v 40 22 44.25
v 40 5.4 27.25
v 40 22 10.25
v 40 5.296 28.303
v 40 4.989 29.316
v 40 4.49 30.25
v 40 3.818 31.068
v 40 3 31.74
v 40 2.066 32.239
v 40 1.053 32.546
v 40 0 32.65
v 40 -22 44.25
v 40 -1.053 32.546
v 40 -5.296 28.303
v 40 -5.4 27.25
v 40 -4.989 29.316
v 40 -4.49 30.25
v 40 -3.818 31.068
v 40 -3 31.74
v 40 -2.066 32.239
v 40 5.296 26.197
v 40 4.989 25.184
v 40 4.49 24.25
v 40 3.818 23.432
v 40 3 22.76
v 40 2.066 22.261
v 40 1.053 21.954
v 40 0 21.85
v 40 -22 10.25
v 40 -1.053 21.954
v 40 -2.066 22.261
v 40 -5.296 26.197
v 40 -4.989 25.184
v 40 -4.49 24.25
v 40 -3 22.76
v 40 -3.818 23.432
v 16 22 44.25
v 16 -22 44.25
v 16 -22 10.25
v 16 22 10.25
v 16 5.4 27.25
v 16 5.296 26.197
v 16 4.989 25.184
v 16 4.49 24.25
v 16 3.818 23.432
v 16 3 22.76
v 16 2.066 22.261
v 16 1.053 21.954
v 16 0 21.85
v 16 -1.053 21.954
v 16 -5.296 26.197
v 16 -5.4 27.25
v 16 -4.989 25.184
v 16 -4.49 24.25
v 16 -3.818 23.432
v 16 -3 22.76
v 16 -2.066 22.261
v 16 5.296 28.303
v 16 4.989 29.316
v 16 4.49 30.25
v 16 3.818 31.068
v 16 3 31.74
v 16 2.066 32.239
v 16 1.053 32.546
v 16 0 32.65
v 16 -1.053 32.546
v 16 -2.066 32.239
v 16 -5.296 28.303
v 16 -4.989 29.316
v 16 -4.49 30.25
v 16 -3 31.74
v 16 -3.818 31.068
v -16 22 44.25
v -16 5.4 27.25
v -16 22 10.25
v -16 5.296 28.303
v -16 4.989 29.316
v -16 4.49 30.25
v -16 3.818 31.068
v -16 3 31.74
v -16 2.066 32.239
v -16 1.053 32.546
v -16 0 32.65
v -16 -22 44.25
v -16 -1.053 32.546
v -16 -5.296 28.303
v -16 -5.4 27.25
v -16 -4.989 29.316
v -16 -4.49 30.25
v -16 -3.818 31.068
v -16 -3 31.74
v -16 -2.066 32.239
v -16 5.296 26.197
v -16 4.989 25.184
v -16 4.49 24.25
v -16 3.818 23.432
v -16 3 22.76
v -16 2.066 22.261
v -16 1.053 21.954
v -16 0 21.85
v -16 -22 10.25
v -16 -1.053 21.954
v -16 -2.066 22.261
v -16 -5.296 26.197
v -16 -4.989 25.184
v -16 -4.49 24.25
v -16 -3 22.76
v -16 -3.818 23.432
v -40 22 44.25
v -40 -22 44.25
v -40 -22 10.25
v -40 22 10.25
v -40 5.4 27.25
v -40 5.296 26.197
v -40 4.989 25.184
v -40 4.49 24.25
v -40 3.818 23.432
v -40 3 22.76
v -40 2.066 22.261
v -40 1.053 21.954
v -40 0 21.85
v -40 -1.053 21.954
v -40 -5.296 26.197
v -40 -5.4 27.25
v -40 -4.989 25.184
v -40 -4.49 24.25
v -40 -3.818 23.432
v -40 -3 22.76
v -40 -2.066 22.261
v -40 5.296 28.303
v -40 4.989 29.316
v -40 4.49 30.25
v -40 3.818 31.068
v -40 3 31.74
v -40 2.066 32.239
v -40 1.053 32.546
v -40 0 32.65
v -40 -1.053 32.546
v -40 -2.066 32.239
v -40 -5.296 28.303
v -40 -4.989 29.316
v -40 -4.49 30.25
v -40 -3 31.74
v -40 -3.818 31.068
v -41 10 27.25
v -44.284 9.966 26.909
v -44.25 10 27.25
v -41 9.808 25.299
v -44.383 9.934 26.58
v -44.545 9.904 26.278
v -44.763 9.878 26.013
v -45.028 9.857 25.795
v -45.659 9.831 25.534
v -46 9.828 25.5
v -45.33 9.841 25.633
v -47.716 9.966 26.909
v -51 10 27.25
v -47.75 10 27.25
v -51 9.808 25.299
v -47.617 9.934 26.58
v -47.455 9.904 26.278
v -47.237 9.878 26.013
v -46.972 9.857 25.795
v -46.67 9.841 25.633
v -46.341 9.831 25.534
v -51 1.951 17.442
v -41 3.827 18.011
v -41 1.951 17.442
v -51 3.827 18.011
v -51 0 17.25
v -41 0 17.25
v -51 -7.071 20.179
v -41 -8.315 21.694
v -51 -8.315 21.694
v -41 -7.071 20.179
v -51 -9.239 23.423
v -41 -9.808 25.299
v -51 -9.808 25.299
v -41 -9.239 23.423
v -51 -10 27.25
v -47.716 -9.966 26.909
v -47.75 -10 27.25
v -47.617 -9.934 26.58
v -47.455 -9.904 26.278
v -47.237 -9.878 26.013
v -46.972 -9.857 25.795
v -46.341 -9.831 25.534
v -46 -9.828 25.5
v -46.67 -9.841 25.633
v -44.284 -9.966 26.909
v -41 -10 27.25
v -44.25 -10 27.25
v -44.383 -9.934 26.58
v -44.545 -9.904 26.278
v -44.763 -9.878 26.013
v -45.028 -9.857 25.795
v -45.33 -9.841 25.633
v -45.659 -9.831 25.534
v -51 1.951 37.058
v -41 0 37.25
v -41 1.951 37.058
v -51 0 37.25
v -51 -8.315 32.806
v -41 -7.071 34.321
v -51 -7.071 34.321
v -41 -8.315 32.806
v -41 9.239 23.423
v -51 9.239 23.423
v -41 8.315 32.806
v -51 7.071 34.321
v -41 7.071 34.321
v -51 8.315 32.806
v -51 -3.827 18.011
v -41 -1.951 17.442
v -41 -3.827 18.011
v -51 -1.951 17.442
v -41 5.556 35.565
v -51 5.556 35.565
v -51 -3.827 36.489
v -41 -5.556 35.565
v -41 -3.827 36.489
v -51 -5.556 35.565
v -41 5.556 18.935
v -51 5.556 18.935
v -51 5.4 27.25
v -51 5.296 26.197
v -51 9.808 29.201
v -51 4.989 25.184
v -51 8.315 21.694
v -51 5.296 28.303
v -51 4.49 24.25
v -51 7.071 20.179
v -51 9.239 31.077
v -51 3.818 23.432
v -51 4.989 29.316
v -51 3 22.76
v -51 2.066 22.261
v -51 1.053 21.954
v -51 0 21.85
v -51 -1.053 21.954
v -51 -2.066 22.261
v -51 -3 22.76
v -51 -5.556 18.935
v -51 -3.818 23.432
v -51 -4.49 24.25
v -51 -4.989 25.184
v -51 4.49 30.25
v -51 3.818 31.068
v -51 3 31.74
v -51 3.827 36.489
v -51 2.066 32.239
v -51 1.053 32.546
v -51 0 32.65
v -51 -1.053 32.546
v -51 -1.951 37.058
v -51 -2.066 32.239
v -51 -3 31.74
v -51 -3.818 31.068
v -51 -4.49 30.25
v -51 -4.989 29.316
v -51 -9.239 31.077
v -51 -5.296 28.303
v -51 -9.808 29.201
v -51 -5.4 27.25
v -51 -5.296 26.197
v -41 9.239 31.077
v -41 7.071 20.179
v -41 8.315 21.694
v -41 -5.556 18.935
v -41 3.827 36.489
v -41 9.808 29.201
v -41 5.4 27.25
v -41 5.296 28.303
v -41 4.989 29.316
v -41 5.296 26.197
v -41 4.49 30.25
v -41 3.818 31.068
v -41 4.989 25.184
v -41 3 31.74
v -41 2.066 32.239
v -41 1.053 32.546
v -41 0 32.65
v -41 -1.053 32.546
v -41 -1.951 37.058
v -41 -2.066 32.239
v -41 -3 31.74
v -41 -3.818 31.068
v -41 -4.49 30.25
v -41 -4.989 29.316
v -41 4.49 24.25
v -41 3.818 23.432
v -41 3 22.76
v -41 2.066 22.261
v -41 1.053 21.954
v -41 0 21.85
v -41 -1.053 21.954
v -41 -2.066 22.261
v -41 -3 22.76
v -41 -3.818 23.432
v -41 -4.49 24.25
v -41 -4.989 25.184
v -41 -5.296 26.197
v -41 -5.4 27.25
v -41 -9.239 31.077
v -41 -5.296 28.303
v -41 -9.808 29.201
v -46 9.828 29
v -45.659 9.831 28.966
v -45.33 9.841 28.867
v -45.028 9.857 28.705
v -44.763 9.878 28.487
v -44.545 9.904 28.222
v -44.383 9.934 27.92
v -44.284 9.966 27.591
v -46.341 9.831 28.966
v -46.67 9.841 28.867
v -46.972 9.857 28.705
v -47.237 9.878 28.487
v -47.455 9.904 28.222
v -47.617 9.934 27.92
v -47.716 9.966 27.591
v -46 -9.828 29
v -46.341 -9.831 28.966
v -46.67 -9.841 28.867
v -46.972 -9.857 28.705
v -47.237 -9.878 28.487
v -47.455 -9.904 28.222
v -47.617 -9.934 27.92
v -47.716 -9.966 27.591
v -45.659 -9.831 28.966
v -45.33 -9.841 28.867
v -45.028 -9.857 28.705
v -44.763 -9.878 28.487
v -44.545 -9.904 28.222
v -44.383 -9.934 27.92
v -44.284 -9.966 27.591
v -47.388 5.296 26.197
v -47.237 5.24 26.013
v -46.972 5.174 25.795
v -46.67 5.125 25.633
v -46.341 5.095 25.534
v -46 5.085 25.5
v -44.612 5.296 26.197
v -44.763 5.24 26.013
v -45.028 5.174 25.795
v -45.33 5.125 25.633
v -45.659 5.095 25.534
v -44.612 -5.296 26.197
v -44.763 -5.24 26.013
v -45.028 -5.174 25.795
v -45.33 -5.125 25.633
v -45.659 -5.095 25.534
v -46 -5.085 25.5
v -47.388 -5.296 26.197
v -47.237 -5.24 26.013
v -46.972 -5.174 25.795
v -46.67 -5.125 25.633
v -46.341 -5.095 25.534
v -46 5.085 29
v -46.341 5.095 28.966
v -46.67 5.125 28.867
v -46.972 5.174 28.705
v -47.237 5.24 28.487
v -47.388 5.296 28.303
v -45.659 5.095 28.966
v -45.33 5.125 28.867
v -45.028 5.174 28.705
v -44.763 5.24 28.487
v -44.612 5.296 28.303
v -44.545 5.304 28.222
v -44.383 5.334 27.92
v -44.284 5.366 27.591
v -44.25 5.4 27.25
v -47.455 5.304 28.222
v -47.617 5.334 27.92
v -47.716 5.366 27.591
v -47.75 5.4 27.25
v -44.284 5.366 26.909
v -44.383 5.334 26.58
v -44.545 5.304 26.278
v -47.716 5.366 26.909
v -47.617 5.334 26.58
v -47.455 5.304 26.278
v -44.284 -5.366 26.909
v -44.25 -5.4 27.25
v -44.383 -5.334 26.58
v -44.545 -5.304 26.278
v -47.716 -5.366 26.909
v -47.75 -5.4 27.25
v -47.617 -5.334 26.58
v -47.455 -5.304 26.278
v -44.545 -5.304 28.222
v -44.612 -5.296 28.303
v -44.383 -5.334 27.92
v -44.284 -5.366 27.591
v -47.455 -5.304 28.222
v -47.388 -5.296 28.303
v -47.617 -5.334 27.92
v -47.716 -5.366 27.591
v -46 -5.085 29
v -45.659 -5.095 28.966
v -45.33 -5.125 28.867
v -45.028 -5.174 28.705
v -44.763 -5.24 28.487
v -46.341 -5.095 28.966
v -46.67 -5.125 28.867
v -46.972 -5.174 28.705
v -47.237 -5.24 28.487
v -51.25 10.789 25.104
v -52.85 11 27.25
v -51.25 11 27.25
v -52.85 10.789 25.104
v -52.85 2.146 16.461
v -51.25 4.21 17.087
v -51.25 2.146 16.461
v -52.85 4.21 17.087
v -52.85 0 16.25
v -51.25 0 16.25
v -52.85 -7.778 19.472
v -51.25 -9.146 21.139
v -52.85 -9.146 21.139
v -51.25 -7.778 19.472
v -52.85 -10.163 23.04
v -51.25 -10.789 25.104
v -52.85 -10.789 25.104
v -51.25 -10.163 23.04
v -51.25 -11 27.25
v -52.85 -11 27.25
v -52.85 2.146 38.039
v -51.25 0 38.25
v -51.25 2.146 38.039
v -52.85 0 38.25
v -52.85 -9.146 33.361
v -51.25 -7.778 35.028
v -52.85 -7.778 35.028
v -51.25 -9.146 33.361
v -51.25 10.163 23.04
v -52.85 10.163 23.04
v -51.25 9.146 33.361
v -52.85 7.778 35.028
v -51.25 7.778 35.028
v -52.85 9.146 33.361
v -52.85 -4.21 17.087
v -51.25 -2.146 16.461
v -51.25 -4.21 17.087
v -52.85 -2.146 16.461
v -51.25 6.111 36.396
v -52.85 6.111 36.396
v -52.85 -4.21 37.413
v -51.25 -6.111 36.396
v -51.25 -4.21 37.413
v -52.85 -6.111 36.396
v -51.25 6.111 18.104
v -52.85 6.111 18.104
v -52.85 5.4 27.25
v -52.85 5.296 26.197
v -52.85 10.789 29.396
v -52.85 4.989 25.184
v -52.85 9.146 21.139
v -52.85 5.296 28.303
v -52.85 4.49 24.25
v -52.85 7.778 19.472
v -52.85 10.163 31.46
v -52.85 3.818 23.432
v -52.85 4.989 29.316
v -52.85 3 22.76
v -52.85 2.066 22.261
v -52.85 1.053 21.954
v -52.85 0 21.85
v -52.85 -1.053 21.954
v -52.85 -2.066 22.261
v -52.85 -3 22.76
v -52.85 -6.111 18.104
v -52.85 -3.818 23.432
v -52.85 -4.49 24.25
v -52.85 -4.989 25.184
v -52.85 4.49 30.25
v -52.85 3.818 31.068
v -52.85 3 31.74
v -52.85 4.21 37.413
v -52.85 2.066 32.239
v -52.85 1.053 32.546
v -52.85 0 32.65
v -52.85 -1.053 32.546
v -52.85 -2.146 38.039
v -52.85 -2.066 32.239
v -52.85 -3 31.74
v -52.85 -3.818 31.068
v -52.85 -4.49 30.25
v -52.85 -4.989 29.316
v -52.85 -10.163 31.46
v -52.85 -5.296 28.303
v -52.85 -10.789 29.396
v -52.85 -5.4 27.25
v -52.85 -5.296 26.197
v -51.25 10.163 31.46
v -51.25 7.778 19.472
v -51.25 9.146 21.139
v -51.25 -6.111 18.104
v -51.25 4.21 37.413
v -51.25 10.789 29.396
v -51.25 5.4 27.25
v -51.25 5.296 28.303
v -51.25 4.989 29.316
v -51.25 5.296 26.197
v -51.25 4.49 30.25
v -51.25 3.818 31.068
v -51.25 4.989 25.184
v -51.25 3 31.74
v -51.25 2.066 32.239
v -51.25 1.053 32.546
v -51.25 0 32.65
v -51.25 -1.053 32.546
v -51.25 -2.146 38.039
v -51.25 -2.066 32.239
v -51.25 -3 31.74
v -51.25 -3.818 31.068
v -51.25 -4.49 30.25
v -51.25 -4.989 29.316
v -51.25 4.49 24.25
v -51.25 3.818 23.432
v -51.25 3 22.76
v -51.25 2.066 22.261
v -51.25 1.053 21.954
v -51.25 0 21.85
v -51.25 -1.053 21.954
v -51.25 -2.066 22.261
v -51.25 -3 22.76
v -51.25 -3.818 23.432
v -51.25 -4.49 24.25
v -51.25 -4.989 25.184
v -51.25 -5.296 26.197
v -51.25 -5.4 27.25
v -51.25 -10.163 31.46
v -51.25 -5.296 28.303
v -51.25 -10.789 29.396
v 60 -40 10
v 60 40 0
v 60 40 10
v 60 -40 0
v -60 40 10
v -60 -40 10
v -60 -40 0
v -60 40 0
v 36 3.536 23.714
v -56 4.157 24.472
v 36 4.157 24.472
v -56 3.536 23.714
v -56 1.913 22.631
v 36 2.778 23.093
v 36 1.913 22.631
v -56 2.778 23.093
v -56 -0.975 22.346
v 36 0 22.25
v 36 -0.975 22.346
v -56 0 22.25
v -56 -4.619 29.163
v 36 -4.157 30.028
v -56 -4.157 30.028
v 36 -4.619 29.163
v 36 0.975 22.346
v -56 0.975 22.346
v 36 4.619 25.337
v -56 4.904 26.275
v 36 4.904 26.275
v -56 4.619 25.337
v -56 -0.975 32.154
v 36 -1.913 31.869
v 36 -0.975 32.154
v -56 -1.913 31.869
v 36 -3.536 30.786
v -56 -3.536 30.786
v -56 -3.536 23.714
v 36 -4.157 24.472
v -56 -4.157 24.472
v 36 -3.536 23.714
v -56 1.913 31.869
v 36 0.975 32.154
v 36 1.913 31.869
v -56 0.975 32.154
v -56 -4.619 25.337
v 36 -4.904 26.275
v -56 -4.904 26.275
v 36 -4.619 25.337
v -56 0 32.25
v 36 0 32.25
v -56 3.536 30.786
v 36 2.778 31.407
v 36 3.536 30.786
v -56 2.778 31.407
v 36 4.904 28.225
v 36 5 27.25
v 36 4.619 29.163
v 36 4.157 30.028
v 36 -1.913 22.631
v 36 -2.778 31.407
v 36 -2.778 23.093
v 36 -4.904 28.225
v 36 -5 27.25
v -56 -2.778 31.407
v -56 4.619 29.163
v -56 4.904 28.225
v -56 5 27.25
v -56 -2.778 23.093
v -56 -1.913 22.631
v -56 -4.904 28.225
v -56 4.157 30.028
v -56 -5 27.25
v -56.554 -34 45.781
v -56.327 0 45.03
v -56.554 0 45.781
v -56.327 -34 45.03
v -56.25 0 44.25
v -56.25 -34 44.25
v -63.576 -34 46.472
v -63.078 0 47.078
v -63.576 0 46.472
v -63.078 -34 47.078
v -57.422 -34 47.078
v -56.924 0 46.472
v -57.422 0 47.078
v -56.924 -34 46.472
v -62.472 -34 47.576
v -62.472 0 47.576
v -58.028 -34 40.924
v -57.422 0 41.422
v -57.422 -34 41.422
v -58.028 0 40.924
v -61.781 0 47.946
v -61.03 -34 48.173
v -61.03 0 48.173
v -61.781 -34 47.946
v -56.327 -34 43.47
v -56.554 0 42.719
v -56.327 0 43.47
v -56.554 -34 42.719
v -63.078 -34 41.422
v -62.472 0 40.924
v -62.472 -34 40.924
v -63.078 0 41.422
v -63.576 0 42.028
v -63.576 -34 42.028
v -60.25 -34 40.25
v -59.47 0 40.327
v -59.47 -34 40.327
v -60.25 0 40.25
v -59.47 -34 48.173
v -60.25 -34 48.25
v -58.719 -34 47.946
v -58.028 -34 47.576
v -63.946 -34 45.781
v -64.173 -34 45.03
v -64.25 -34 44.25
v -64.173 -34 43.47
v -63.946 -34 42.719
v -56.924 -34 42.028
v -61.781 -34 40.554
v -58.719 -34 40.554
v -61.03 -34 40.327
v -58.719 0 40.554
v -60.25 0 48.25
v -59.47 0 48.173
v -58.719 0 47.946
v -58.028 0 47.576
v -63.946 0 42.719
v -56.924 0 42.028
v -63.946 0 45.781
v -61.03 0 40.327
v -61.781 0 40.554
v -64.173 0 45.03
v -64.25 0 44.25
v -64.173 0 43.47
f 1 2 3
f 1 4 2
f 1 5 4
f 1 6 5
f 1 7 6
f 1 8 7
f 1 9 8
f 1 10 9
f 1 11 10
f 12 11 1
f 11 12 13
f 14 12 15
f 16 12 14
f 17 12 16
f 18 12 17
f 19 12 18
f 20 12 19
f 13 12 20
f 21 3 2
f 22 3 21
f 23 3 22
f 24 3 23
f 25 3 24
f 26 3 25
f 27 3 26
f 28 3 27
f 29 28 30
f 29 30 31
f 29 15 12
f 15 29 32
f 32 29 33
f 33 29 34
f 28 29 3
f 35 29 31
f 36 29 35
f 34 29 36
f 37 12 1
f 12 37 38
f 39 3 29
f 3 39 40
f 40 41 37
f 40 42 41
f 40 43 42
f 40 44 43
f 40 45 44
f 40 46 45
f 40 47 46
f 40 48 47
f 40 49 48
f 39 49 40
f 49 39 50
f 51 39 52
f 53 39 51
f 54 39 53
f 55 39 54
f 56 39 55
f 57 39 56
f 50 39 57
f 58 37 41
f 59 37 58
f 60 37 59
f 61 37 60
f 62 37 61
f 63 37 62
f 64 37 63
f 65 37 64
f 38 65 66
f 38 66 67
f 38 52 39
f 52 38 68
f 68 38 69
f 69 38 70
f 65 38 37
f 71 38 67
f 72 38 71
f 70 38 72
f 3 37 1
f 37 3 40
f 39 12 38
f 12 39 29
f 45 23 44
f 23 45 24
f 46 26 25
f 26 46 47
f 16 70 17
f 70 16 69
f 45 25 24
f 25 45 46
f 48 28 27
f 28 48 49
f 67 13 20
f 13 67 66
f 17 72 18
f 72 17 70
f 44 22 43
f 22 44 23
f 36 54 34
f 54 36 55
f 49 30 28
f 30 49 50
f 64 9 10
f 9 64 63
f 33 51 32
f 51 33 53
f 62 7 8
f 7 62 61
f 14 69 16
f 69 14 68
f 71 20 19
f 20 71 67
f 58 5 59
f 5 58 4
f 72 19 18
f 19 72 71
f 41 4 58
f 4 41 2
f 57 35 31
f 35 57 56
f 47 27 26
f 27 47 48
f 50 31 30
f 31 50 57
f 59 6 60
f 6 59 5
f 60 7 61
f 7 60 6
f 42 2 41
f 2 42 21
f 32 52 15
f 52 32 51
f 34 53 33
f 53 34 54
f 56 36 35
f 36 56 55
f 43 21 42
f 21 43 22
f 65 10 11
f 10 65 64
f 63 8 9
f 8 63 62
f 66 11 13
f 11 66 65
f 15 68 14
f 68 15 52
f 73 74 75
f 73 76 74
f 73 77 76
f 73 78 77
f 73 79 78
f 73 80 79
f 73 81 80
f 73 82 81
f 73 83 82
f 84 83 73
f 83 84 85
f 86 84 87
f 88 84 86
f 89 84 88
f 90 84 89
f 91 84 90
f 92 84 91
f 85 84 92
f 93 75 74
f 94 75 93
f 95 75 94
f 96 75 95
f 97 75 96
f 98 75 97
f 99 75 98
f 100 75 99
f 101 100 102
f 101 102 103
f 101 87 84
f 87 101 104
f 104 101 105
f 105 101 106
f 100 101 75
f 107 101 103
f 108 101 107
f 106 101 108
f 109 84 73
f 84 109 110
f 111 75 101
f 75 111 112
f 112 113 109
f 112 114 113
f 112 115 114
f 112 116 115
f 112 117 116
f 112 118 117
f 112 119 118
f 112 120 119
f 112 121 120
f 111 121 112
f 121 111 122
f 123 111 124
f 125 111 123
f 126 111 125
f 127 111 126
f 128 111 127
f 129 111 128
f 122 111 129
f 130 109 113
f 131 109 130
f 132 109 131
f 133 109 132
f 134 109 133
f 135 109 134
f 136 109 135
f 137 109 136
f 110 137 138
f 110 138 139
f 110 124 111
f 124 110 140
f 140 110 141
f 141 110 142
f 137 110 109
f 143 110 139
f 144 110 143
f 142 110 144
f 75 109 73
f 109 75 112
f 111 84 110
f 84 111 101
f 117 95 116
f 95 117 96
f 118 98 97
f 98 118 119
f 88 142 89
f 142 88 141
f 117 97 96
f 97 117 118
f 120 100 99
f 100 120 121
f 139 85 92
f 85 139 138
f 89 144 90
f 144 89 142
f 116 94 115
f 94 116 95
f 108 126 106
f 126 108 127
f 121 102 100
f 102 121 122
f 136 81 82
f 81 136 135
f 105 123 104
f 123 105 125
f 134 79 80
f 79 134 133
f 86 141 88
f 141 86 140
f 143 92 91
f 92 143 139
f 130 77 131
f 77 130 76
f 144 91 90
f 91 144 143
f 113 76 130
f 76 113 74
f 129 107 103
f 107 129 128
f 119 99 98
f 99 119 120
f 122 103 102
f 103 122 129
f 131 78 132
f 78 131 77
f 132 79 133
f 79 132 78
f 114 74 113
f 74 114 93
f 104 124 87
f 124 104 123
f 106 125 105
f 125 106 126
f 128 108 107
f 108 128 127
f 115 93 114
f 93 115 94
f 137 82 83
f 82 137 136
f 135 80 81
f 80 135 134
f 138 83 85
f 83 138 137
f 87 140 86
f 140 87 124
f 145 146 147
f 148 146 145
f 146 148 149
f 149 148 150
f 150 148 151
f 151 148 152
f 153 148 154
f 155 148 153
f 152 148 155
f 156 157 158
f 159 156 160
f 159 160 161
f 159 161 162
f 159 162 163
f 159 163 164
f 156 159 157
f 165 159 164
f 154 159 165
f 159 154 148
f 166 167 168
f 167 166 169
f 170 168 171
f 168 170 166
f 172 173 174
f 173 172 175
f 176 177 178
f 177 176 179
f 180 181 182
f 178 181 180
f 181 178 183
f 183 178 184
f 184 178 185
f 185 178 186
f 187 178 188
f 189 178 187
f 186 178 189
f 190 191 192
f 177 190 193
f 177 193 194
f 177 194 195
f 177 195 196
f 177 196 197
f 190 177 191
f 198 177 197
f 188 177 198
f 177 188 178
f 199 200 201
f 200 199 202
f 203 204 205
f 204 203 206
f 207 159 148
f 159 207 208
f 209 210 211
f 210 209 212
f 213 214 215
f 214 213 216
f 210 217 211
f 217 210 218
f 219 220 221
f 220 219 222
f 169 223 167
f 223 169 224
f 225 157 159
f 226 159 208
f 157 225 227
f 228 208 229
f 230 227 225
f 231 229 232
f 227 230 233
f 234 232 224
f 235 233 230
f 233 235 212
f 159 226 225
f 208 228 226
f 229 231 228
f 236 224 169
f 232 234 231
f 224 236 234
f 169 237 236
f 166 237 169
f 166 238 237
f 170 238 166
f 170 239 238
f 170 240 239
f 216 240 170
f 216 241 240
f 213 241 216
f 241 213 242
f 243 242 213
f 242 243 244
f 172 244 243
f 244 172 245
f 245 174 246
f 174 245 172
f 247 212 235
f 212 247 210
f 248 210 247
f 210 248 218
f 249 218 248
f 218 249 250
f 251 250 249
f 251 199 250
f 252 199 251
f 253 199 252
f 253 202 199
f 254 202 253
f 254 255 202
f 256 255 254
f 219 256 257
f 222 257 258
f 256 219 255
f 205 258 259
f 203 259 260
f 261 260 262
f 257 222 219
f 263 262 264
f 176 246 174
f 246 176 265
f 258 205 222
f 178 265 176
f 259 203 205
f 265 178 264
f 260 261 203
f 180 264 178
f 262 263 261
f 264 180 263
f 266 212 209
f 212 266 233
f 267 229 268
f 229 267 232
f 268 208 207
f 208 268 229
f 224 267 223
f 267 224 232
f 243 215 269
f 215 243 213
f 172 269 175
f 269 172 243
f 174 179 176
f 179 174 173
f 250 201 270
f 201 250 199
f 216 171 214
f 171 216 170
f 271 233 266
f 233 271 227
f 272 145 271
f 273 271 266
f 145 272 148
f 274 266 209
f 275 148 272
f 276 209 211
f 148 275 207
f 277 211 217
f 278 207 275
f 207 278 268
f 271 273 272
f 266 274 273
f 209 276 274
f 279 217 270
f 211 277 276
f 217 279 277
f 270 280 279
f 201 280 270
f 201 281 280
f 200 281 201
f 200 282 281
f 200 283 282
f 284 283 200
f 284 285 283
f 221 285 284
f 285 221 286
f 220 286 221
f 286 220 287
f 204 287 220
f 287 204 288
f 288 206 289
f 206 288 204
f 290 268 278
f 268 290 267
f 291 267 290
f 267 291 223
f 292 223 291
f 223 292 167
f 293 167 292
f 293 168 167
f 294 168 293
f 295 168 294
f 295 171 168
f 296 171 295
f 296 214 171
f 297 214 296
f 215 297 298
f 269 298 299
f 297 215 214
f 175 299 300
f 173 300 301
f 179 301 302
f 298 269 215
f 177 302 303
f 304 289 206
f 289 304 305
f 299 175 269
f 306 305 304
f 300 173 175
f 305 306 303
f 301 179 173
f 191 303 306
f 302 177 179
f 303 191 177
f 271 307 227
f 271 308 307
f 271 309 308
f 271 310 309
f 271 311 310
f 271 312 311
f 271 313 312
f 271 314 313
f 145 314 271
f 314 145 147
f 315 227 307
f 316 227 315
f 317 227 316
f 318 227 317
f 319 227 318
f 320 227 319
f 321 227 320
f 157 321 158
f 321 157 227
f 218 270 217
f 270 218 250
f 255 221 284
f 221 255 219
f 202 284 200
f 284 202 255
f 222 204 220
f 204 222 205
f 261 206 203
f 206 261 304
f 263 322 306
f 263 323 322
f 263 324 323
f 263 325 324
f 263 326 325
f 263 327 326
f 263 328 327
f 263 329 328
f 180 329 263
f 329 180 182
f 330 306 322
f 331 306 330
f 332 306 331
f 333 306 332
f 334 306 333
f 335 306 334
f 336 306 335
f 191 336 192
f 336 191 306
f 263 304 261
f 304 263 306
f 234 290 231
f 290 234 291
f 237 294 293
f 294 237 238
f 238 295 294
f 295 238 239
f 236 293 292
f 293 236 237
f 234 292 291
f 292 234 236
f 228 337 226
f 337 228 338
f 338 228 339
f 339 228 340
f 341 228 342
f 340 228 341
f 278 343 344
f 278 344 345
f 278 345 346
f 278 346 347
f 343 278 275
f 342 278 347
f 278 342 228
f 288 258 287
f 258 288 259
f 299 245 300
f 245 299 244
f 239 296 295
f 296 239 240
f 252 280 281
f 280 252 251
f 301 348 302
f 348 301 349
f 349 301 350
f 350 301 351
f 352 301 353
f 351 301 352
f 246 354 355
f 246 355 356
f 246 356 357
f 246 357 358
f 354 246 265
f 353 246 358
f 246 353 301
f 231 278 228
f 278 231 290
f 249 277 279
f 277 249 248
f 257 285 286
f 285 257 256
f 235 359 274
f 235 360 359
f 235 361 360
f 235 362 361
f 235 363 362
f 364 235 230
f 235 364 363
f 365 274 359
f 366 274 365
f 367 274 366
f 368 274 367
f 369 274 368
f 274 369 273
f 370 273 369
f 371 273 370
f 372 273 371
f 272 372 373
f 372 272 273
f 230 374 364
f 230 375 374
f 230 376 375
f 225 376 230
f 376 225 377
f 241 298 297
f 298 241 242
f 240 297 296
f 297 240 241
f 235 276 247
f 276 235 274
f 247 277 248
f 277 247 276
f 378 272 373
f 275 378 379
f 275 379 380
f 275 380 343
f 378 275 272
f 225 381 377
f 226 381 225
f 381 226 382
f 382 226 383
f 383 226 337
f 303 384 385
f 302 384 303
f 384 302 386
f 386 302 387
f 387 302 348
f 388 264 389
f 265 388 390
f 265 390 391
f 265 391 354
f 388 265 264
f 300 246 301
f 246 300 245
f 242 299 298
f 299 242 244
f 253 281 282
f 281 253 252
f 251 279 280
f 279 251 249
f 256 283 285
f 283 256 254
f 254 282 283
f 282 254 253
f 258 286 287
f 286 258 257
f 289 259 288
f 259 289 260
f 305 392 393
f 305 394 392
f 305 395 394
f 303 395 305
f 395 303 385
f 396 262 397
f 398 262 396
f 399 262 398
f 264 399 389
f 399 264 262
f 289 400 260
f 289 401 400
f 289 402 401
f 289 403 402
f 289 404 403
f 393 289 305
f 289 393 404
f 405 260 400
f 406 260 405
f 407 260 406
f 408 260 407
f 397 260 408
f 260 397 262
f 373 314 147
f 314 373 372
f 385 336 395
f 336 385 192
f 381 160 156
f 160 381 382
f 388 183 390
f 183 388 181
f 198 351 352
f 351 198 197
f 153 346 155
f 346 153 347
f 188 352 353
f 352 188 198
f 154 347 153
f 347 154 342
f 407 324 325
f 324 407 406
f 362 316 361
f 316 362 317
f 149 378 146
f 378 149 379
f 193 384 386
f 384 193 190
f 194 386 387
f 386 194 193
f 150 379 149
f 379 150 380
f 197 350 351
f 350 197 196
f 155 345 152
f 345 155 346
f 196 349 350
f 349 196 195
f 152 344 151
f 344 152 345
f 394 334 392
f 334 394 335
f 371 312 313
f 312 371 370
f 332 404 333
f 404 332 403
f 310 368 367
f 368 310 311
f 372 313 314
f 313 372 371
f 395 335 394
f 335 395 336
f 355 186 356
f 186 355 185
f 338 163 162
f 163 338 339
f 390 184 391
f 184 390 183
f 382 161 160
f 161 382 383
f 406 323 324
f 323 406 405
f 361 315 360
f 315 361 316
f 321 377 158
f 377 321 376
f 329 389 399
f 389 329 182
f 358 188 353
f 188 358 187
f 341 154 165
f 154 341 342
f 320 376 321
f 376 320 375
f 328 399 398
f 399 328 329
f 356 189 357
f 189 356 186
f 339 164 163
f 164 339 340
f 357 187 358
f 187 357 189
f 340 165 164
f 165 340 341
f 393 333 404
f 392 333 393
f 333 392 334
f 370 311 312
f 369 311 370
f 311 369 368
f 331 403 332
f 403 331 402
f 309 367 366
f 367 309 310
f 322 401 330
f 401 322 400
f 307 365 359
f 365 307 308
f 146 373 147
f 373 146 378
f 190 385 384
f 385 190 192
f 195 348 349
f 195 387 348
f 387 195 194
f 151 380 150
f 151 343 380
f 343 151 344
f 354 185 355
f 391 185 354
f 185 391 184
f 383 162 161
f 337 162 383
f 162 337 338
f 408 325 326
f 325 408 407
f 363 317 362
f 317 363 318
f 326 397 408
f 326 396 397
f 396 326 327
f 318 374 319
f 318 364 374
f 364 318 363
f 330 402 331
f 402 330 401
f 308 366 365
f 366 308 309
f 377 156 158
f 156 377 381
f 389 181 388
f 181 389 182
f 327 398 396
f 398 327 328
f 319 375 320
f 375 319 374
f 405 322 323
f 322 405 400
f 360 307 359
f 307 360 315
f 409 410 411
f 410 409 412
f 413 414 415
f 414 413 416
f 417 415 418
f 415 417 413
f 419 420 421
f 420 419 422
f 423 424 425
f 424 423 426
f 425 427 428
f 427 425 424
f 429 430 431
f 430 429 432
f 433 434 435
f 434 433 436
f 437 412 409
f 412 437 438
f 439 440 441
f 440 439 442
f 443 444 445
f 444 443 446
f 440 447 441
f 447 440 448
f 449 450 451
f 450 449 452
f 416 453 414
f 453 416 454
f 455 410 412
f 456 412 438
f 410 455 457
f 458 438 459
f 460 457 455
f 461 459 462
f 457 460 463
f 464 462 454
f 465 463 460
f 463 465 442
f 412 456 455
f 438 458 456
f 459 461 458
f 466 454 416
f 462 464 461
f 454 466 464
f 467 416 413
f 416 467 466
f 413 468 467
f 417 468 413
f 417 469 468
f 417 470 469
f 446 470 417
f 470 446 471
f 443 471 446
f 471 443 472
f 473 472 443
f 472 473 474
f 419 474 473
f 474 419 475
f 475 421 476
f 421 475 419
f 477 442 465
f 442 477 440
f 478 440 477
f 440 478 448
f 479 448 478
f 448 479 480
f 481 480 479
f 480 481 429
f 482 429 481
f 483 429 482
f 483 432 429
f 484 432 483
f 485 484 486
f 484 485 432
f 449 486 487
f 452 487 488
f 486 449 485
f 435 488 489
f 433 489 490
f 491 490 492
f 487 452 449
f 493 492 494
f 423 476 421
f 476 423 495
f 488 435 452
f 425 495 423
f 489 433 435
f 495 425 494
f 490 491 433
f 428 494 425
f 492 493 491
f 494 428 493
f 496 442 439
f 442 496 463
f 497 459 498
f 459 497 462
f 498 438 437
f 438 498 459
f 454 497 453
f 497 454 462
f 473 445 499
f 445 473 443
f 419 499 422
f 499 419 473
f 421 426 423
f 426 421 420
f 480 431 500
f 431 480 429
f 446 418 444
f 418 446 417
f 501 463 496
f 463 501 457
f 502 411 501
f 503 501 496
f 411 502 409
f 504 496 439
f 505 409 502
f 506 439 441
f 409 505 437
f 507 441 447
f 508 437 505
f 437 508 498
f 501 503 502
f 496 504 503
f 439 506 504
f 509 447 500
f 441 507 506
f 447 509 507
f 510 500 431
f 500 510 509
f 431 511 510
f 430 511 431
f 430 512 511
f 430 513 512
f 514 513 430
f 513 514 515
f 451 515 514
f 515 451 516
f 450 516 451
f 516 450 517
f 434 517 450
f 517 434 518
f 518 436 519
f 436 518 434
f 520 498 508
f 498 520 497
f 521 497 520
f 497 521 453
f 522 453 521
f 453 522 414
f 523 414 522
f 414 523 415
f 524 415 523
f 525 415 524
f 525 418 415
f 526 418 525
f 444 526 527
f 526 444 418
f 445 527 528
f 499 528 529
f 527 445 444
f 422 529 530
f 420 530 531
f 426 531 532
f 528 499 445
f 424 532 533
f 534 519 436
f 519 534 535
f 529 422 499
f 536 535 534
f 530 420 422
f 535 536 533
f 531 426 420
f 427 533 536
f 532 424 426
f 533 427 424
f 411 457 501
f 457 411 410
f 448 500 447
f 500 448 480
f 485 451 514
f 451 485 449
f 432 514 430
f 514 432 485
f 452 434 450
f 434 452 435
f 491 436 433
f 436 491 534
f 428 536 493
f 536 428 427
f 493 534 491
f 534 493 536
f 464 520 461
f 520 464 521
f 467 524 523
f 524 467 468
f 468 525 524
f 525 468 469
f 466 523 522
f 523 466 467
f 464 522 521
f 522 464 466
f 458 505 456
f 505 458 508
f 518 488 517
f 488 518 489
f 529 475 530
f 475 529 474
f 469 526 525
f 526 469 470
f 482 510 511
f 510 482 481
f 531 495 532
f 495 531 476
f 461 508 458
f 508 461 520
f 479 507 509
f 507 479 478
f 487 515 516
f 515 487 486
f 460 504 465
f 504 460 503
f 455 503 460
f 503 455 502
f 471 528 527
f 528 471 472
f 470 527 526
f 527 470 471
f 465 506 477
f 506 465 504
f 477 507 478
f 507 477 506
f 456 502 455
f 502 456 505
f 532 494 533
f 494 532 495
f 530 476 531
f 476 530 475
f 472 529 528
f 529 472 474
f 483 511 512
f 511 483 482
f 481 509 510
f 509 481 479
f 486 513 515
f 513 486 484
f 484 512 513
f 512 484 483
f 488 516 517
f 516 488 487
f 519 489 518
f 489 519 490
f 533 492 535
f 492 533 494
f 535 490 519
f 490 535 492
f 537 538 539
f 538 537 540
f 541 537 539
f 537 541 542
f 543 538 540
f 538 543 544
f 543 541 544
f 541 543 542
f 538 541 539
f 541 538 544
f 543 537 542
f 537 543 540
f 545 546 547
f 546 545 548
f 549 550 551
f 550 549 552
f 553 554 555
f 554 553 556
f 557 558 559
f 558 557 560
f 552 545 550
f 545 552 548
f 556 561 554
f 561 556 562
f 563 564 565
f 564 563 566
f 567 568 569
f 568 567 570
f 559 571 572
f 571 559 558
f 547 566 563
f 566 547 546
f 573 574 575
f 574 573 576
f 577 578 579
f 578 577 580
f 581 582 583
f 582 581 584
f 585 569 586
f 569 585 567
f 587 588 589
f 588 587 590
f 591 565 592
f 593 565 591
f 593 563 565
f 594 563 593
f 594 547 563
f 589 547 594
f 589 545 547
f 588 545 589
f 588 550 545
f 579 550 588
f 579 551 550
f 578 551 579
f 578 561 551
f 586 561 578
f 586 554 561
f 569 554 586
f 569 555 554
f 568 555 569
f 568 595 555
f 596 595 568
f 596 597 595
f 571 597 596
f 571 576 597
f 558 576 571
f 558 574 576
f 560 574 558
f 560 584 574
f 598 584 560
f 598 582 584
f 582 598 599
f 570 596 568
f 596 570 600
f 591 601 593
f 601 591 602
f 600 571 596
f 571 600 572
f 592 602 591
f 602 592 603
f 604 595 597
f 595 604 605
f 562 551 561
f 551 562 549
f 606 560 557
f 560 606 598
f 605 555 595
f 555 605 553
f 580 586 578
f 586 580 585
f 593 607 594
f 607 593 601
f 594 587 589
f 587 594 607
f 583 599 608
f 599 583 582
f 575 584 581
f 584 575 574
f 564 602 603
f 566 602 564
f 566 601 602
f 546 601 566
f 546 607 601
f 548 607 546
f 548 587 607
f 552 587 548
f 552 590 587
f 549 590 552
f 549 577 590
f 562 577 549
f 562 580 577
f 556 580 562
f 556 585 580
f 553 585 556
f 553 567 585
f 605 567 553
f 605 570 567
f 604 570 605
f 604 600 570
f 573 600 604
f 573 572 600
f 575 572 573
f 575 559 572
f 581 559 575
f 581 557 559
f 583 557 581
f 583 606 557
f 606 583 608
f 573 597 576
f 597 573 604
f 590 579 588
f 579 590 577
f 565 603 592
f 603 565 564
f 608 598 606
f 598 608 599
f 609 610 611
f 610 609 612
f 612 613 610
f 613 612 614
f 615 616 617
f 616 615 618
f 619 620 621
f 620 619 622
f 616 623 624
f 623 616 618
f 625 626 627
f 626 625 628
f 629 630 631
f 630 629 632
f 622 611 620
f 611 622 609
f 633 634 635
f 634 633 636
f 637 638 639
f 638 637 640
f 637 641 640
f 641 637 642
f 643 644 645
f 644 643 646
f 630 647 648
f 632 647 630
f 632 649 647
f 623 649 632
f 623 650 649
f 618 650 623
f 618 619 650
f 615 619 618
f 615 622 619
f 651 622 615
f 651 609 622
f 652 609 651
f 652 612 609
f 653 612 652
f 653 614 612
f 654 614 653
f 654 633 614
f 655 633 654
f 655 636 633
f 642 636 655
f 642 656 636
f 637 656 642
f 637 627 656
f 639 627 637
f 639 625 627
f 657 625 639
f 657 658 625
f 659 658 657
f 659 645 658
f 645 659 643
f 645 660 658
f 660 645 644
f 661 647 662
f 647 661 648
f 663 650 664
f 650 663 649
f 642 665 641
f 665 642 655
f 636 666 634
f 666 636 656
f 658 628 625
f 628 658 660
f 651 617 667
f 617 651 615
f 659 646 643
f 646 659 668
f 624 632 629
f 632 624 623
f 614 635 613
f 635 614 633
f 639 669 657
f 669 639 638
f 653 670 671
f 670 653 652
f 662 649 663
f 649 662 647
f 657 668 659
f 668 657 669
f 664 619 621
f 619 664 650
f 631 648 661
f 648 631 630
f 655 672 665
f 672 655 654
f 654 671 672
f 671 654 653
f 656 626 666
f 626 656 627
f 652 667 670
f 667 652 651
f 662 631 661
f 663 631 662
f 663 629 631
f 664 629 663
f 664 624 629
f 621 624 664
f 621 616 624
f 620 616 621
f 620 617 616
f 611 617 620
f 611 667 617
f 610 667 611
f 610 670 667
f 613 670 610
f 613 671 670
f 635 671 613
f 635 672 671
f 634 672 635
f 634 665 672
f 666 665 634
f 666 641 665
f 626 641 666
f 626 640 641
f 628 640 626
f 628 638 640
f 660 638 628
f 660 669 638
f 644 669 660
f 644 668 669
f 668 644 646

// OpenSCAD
$fn = 32;

// ------------------------------------------------------------------------
// Machine vise: screw d10, jaws 24 x 34 mm
// Every part is its own module, assembly() places every instance.
// ------------------------------------------------------------------------

// --- part 1 ---
module vise_bed() {
  difference() {
    translate([-60, -40, 0]) cube([120, 80, 10]);
  }
}

// --- part 2 ---
module vise_jaw() {
  difference() {
    translate([-12, -22, 0]) cube([24, 44, 34]);
    translate([0, 0, 17]) rotate([0, 90, 0]) cylinder(h = 26, d = 10.8, center = true);
  }
}

// --- part 3 ---
module vise_screw() {
  translate([0, 0, -46]) cylinder(h = 92, d = 10);
}

// --- part 4 ---
module screw_collar() {
  difference() {
    cylinder(h = 10, d = 20);
    translate([0, 0, -1]) cylinder(h = 12, d = 10.8);
    translate([0, 0, 5]) rotate([90, 0, 0]) cylinder(h = 22, d = 3.5, center = true);
  }
}

// --- part 5 ---
module screw_washer() {
  difference() {
      translate([0, 0, 0]) cylinder(h = 1.6, d = 22);
      translate([0, 0, -1]) cylinder(h = 3.6, d = 10.8);
    }
}

// --- part 6 ---
module vise_handle() {
  cylinder(h = 34, d = 8);
}

// --- assembly ---
module assembly() {
  color([0.80, 0.24, 0.20]) translate([0, 0, 0]) rotate([0, 0, 0]) vise_bed();
  color([0.20, 0.45, 0.75]) translate([28, 0, 10.25]) rotate([0, 0, 0]) vise_jaw();
  color([0.25, 0.62, 0.32]) translate([-28, 0, 10.25]) rotate([0, 0, 0]) vise_jaw();
  color([0.92, 0.70, 0.18]) translate([-10, 0, 27.25]) rotate([0, 90, 0]) vise_screw();
  color([0.58, 0.35, 0.70]) translate([-51, 0, 27.25]) rotate([0, 90, 0]) screw_collar();
  color([0.16, 0.66, 0.66]) translate([-52.85, 0, 27.25]) rotate([0, 90, 0]) screw_washer();
  color([0.85, 0.48, 0.18]) translate([-60.25, 0, 44.25]) rotate([90, 0, 0]) vise_handle();
}

assembly();
